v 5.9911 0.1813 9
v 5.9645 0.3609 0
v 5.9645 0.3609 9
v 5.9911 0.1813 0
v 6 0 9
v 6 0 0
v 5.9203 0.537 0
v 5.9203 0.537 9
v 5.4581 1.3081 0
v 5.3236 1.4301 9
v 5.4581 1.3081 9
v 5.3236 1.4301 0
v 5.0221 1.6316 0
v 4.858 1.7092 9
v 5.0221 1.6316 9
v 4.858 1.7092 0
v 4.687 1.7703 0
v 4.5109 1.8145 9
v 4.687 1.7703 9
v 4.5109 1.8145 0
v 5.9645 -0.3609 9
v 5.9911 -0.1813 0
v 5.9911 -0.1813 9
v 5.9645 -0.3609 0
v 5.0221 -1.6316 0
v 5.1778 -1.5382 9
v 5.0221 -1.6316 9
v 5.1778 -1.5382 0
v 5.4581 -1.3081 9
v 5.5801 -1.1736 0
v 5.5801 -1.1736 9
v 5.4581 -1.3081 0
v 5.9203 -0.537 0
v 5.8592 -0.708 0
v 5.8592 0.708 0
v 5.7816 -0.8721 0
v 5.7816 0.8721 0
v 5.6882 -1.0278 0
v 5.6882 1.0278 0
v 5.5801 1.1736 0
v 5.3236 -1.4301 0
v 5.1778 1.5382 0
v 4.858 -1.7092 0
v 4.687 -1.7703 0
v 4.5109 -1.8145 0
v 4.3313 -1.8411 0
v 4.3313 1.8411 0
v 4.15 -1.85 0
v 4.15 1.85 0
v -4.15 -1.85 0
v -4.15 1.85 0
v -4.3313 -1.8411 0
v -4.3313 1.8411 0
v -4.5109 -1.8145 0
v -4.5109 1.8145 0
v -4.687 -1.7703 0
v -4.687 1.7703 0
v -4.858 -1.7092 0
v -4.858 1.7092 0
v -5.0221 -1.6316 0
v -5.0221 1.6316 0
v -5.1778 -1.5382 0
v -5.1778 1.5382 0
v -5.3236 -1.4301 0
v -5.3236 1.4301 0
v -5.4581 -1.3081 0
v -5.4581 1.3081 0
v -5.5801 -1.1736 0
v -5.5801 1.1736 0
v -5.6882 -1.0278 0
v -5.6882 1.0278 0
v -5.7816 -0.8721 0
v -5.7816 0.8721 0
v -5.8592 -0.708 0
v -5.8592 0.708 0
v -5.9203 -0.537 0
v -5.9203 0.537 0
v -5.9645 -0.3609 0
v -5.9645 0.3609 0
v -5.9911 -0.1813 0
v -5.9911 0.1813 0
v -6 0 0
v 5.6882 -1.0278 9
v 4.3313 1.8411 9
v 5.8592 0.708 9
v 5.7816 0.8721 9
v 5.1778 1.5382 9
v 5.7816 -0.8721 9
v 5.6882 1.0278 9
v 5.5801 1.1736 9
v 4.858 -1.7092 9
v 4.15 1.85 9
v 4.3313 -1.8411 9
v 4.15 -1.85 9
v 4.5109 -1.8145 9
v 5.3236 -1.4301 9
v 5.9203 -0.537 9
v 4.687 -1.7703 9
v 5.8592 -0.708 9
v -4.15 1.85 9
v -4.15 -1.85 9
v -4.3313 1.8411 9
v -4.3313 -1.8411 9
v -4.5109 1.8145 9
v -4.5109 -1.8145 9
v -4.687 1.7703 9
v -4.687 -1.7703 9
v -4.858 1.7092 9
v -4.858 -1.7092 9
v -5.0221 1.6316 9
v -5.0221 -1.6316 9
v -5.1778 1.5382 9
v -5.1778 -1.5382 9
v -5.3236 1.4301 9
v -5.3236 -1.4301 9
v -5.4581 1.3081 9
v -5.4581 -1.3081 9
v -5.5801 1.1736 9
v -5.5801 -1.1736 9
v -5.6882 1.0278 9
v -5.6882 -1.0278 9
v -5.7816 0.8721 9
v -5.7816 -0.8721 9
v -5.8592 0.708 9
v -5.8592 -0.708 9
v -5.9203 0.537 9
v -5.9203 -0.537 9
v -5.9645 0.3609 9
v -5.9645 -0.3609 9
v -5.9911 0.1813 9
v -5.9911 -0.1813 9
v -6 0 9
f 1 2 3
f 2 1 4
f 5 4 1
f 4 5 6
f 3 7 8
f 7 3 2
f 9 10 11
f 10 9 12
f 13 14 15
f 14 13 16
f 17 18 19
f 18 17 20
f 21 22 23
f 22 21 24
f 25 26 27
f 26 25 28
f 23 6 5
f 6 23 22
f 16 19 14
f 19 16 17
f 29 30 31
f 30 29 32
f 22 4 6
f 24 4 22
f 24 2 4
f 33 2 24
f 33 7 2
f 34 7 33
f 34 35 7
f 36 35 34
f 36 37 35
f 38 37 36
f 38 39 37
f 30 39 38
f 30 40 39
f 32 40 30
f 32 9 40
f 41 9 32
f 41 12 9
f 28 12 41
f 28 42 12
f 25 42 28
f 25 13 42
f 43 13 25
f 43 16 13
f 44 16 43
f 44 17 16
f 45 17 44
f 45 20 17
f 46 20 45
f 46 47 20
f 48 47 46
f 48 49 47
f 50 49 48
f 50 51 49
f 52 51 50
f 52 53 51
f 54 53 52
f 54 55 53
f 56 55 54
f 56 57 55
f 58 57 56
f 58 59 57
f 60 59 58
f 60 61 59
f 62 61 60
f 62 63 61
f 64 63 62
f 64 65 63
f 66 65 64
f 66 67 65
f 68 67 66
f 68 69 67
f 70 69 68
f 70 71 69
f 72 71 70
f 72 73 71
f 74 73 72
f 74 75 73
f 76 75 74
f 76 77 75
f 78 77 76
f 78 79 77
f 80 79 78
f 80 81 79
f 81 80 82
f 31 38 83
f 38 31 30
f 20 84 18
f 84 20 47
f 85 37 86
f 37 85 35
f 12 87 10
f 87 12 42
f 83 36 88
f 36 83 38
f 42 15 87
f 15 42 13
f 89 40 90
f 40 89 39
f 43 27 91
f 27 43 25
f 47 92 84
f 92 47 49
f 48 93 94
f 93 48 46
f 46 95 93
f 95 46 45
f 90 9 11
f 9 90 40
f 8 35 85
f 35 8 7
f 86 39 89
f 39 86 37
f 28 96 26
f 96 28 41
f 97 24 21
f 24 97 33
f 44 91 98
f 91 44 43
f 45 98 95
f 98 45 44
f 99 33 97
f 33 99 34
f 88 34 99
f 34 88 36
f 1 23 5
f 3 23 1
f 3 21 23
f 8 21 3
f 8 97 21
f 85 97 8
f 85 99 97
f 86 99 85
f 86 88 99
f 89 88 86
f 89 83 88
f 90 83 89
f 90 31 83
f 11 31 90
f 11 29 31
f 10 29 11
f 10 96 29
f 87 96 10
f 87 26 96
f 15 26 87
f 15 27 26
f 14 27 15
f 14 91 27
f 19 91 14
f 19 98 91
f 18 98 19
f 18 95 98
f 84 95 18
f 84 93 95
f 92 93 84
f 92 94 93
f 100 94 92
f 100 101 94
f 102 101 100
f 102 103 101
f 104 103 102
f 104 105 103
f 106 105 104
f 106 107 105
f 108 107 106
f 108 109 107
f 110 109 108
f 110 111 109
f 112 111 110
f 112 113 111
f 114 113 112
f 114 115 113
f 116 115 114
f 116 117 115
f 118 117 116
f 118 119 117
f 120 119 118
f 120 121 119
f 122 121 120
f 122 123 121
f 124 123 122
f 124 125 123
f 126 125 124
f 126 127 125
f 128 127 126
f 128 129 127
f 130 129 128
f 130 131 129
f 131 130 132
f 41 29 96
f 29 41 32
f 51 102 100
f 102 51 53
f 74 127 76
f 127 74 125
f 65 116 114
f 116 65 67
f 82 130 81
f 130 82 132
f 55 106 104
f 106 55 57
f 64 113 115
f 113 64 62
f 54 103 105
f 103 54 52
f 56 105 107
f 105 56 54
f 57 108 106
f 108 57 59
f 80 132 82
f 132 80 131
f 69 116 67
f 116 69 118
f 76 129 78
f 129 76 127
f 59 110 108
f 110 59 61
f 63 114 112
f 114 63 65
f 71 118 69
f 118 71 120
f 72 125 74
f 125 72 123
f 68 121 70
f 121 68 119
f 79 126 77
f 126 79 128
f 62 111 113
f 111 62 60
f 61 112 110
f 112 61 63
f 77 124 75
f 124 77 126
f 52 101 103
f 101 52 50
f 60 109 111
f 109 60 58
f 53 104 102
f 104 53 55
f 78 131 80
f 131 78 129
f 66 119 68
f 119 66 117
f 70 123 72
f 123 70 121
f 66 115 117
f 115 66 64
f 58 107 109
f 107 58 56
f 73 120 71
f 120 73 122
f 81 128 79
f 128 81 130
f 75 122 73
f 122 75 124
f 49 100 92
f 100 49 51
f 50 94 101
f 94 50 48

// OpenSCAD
twidth=3.7;
tlength=12;
theight=9;

toffset = tlength / 2 - twidth / 2;
// M6
translate([+toffset,0,0]) cylinder(d=twidth, h=theight, $fn=64);
translate([-toffset,0,0]) cylinder(d=twidth, h=theight, $fn=64);
//#cube([0, offset*2, height], true);


translate([-toffset,- twidth / 2,0]) cube([toffset*2,twidth,theight]);
